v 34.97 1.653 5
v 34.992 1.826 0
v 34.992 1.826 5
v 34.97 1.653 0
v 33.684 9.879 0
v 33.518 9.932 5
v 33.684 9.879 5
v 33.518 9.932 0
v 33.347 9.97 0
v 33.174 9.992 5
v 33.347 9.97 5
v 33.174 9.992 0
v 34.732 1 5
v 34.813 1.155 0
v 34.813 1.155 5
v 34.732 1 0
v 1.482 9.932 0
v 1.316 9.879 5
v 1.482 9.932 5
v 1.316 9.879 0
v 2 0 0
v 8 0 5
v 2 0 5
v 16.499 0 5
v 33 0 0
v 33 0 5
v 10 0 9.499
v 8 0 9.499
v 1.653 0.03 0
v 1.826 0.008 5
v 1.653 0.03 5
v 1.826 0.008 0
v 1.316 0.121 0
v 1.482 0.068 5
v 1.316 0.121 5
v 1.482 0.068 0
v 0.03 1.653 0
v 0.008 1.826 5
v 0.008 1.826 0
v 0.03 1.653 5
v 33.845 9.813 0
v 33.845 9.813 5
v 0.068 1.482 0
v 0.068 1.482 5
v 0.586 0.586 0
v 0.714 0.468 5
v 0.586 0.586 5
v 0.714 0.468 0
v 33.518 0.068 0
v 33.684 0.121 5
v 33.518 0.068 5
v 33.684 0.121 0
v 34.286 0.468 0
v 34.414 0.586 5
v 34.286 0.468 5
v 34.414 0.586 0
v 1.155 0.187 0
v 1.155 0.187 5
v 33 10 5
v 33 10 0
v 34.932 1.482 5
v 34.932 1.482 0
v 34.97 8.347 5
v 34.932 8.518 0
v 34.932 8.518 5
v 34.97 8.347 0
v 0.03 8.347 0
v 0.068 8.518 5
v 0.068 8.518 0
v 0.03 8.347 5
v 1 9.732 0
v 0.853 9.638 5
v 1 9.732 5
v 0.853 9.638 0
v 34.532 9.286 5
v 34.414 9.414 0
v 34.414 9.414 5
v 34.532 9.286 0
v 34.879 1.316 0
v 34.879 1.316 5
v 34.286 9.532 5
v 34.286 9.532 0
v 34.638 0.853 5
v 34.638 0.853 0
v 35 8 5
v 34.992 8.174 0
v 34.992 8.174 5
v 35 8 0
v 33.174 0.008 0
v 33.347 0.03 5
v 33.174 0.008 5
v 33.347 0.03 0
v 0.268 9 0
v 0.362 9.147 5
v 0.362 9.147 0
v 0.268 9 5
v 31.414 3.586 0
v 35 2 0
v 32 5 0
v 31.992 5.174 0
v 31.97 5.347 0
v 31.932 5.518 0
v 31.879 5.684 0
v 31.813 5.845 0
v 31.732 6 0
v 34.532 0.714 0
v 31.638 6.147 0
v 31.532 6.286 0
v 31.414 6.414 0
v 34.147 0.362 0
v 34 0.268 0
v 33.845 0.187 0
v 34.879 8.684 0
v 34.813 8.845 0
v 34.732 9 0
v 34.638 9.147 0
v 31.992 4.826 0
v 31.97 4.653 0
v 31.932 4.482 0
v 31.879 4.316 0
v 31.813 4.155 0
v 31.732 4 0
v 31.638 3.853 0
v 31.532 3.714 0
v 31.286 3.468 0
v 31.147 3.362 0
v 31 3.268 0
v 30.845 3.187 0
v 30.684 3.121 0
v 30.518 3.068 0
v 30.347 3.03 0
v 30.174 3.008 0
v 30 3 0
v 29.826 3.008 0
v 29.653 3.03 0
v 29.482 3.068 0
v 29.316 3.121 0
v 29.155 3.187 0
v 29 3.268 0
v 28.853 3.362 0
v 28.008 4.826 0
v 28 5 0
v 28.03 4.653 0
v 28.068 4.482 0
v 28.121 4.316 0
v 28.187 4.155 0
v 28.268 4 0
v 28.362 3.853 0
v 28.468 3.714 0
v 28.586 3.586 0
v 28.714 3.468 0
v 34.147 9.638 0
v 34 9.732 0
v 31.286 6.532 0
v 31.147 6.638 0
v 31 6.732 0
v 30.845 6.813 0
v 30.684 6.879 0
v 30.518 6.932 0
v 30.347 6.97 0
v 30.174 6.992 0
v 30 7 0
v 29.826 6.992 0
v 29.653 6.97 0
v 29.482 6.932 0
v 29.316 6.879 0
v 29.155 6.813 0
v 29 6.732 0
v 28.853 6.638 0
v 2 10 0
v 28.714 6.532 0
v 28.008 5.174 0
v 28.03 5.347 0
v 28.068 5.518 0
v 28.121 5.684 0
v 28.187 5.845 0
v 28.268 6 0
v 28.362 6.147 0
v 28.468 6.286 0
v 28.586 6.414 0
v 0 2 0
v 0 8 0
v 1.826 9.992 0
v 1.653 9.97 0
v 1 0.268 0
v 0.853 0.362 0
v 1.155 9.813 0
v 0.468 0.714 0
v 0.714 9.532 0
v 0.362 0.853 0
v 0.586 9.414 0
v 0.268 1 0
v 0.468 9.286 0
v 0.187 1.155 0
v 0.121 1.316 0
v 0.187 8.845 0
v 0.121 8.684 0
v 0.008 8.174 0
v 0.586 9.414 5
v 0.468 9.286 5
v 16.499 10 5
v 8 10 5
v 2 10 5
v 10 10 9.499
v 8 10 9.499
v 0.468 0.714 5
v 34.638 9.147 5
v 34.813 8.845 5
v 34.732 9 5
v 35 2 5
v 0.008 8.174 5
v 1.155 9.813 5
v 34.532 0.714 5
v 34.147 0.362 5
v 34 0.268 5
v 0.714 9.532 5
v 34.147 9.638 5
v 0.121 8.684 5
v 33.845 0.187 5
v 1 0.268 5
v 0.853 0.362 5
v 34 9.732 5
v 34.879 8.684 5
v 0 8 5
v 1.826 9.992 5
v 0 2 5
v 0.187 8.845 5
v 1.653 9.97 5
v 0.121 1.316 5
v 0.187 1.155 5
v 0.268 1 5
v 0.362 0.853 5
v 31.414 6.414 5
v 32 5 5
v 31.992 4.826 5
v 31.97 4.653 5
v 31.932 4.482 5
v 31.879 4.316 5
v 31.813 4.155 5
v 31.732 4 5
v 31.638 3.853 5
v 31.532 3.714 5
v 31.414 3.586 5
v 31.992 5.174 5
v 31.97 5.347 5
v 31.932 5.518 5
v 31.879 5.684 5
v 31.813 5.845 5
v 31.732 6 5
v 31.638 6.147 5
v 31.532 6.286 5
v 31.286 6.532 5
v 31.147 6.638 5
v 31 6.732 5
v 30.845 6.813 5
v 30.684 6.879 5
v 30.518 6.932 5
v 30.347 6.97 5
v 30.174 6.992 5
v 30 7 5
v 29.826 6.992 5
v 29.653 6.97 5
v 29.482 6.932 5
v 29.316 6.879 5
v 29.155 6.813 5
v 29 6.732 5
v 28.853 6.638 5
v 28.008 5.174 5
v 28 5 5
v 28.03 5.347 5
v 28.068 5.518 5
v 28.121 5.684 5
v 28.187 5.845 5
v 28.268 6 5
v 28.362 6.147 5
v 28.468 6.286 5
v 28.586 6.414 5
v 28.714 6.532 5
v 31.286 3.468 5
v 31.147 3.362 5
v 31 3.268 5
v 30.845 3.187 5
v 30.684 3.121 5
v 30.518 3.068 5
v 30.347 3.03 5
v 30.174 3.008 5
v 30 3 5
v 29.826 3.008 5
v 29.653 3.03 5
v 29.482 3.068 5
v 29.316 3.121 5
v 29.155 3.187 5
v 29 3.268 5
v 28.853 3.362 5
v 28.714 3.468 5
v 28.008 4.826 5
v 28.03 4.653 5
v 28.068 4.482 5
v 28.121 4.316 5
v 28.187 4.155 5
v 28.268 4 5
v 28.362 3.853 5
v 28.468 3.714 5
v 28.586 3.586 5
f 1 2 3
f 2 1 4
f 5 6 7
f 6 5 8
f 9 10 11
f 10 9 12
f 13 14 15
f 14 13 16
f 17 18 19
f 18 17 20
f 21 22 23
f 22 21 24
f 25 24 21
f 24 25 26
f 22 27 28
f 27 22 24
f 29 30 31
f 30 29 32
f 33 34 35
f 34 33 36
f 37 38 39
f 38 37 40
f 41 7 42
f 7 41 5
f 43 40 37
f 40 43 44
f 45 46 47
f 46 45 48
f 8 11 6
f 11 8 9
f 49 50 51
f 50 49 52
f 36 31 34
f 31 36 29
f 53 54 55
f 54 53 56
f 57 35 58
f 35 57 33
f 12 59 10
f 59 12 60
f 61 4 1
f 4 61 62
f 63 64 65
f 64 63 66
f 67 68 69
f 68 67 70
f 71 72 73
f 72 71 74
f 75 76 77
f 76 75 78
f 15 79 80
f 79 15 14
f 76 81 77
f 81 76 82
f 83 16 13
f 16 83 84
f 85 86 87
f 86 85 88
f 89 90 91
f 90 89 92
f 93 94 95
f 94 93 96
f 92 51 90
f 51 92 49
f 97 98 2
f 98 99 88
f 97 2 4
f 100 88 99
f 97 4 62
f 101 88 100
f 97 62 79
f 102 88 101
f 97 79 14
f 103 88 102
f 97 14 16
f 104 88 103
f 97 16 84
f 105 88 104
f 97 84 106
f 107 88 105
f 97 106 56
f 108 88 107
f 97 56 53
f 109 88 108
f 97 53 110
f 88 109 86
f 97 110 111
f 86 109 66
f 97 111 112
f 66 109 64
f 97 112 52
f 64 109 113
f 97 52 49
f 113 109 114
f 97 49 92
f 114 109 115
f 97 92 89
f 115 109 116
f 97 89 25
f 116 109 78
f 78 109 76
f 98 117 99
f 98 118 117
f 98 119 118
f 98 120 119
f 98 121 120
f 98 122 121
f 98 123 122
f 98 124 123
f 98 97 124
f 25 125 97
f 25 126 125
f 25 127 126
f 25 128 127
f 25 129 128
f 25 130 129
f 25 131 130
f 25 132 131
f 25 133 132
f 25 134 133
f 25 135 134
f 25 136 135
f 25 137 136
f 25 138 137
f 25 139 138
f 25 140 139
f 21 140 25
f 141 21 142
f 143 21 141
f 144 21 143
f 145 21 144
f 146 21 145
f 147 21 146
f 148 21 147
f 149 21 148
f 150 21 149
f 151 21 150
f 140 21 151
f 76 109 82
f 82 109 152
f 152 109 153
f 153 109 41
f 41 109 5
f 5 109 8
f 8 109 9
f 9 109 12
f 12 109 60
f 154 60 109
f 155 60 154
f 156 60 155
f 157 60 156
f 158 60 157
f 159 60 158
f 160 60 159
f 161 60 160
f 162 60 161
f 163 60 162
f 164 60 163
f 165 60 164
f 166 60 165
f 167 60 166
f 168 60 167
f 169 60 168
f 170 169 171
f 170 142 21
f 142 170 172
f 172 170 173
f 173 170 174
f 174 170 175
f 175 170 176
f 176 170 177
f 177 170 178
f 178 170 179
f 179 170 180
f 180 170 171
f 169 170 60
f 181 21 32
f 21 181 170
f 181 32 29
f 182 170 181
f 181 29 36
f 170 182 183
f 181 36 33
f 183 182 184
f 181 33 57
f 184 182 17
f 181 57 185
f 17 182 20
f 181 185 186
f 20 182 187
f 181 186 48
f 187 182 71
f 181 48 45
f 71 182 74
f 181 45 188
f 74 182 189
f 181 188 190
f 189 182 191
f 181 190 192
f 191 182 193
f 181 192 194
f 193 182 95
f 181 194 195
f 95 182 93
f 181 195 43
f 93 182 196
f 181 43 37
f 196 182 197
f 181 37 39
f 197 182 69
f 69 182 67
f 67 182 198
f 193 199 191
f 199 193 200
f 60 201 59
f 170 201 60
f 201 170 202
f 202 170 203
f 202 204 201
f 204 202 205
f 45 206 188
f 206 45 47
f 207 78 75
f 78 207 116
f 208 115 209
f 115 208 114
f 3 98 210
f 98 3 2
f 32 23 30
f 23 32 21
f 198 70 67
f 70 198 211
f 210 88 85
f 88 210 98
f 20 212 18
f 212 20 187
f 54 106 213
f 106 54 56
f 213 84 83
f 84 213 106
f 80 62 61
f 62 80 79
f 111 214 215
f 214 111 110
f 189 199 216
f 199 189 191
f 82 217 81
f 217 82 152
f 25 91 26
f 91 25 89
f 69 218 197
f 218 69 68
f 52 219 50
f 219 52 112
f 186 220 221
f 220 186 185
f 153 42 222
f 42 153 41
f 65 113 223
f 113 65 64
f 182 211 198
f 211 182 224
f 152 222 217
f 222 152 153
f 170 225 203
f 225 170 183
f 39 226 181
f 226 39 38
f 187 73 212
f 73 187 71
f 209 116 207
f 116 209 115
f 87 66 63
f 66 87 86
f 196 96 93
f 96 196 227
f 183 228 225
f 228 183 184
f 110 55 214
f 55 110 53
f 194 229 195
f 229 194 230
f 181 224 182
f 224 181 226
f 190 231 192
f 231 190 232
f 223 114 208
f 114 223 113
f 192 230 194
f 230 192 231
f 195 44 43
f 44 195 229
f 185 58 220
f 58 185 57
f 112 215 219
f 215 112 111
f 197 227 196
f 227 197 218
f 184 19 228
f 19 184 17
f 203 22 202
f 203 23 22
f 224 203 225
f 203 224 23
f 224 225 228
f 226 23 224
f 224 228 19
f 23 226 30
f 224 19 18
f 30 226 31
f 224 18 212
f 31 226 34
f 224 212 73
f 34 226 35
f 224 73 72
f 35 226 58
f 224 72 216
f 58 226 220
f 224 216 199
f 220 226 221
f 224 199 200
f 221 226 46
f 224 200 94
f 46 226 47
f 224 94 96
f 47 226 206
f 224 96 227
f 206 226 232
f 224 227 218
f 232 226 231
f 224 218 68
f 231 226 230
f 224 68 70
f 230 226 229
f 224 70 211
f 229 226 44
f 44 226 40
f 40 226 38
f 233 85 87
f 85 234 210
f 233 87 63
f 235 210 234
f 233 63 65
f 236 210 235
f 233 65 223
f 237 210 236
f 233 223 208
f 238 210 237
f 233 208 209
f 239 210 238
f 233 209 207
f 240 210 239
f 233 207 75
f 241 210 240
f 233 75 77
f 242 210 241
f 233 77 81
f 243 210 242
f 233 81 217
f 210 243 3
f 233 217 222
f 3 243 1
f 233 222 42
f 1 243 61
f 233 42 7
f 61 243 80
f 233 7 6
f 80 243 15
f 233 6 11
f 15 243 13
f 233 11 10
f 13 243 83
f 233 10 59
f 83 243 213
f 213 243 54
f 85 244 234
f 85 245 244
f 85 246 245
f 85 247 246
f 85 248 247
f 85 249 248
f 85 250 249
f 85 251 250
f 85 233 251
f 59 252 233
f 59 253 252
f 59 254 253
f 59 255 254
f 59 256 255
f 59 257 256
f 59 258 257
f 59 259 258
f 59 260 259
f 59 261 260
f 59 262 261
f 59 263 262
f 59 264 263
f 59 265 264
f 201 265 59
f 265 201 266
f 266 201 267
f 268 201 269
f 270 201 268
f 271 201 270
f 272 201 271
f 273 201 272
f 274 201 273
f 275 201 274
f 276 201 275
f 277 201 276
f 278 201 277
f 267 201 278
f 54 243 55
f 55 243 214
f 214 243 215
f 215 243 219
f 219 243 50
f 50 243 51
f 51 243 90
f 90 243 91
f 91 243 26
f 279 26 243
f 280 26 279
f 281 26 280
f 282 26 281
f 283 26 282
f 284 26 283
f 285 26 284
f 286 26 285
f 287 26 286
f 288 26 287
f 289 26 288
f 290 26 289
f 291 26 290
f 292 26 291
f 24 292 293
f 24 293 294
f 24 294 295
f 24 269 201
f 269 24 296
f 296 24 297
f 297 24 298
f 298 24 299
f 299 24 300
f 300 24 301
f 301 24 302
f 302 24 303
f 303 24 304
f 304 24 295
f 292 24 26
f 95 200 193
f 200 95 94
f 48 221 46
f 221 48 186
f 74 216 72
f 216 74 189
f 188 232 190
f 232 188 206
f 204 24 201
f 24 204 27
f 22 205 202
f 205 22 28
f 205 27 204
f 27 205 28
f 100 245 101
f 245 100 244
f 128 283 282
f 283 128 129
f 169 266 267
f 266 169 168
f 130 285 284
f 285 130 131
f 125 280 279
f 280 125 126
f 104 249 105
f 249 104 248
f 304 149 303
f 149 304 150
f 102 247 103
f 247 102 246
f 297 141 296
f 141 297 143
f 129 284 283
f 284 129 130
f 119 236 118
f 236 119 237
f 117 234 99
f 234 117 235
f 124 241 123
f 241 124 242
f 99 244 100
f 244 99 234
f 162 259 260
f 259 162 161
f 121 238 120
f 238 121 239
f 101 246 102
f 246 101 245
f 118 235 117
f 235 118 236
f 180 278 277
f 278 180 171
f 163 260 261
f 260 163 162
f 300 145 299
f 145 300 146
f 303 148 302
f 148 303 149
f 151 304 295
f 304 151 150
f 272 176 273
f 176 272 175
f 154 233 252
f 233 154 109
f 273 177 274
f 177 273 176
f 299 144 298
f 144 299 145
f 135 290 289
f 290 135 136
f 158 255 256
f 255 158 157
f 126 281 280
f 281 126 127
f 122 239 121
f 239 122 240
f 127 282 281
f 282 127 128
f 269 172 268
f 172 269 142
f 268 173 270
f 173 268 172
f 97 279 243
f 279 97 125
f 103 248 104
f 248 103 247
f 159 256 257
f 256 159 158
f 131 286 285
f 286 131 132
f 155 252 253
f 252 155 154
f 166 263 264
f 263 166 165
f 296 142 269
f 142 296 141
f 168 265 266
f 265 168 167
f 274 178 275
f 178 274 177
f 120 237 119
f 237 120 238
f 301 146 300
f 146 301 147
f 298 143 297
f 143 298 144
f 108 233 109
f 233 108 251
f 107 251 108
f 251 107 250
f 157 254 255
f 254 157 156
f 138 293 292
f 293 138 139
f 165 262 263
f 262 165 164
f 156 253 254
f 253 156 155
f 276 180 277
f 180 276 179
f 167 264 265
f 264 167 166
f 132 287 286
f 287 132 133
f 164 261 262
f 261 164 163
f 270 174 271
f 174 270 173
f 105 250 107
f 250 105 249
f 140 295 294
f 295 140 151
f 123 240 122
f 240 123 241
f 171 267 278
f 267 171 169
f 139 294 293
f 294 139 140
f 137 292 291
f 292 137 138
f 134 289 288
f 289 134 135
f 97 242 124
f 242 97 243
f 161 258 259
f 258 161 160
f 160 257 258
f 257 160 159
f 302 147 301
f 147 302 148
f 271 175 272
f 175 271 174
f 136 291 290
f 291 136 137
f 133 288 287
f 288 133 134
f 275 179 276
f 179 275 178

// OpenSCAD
// Extruder tool for Makerfarm i3v.

// Set to 0 for final STL compilation (slow). Set to 1 for quick
// debugging (lower quality)


// Controls the opening of the extruder.
body_thickness = 5; // [3:8]
// Width.
body_width = 10;   // [5:15]
// Lengnth.
body_length = 35;  // [10:50]
// Size of the stopper.
step_height = 4.5; // [0:6]
// Controls the insertion depth.
step_offset = 8;  // [0:15]
// Hole diameter.
hole_diameter = 4;  // [0:8]
// Hole distance from the edge.
hole_offset = 5;  // [0:15]
// Corner rounding radius
body_corner_radius = 2;  // [0:10]

/* [Hidden] */

step_top_length = 2;
step_angle = 45;

debug = 0;

$fn = (debug != 0) ? 12 : 72;

// Small >0 dimension to maintain manifold.
eps = 0.001;
eps2 = 2*eps;

// Generic cube with for corners rounded.
module rounded_cube(xlen, ylen, zlen, r) {
  translate([r, r, 0]) minkowski() {
    cube([xlen-2*r, ylen-2*r, zlen/2]);
    cylinder(r=r, h=zlen/2);
 }
}

// The main block.
module body() {
  rounded_cube(body_length, body_width, body_thickness, body_corner_radius);
}

module hole() {
  translate([body_length - hole_offset, body_width/2, -eps]) 
    cylinder(r=hole_diameter/2, h= body_thickness+eps2);
}

// The step above the body.
module step() {
  step_base_length = step_top_length + (step_height / tan(step_angle));
  translate([step_offset, body_width, body_thickness - eps]) 
  rotate([90, 0, 0]) linear_extrude(height=body_width)
      polygon(points=[
          [0,0], 
          [0, step_height], 
          [step_top_length, step_height], 
          [step_top_length + step_base_length, 0]]);
}

// The entire part.
module main() {
  difference() {
    union() {
      body();
      step();
    }
    hole();
  }
}

main();
